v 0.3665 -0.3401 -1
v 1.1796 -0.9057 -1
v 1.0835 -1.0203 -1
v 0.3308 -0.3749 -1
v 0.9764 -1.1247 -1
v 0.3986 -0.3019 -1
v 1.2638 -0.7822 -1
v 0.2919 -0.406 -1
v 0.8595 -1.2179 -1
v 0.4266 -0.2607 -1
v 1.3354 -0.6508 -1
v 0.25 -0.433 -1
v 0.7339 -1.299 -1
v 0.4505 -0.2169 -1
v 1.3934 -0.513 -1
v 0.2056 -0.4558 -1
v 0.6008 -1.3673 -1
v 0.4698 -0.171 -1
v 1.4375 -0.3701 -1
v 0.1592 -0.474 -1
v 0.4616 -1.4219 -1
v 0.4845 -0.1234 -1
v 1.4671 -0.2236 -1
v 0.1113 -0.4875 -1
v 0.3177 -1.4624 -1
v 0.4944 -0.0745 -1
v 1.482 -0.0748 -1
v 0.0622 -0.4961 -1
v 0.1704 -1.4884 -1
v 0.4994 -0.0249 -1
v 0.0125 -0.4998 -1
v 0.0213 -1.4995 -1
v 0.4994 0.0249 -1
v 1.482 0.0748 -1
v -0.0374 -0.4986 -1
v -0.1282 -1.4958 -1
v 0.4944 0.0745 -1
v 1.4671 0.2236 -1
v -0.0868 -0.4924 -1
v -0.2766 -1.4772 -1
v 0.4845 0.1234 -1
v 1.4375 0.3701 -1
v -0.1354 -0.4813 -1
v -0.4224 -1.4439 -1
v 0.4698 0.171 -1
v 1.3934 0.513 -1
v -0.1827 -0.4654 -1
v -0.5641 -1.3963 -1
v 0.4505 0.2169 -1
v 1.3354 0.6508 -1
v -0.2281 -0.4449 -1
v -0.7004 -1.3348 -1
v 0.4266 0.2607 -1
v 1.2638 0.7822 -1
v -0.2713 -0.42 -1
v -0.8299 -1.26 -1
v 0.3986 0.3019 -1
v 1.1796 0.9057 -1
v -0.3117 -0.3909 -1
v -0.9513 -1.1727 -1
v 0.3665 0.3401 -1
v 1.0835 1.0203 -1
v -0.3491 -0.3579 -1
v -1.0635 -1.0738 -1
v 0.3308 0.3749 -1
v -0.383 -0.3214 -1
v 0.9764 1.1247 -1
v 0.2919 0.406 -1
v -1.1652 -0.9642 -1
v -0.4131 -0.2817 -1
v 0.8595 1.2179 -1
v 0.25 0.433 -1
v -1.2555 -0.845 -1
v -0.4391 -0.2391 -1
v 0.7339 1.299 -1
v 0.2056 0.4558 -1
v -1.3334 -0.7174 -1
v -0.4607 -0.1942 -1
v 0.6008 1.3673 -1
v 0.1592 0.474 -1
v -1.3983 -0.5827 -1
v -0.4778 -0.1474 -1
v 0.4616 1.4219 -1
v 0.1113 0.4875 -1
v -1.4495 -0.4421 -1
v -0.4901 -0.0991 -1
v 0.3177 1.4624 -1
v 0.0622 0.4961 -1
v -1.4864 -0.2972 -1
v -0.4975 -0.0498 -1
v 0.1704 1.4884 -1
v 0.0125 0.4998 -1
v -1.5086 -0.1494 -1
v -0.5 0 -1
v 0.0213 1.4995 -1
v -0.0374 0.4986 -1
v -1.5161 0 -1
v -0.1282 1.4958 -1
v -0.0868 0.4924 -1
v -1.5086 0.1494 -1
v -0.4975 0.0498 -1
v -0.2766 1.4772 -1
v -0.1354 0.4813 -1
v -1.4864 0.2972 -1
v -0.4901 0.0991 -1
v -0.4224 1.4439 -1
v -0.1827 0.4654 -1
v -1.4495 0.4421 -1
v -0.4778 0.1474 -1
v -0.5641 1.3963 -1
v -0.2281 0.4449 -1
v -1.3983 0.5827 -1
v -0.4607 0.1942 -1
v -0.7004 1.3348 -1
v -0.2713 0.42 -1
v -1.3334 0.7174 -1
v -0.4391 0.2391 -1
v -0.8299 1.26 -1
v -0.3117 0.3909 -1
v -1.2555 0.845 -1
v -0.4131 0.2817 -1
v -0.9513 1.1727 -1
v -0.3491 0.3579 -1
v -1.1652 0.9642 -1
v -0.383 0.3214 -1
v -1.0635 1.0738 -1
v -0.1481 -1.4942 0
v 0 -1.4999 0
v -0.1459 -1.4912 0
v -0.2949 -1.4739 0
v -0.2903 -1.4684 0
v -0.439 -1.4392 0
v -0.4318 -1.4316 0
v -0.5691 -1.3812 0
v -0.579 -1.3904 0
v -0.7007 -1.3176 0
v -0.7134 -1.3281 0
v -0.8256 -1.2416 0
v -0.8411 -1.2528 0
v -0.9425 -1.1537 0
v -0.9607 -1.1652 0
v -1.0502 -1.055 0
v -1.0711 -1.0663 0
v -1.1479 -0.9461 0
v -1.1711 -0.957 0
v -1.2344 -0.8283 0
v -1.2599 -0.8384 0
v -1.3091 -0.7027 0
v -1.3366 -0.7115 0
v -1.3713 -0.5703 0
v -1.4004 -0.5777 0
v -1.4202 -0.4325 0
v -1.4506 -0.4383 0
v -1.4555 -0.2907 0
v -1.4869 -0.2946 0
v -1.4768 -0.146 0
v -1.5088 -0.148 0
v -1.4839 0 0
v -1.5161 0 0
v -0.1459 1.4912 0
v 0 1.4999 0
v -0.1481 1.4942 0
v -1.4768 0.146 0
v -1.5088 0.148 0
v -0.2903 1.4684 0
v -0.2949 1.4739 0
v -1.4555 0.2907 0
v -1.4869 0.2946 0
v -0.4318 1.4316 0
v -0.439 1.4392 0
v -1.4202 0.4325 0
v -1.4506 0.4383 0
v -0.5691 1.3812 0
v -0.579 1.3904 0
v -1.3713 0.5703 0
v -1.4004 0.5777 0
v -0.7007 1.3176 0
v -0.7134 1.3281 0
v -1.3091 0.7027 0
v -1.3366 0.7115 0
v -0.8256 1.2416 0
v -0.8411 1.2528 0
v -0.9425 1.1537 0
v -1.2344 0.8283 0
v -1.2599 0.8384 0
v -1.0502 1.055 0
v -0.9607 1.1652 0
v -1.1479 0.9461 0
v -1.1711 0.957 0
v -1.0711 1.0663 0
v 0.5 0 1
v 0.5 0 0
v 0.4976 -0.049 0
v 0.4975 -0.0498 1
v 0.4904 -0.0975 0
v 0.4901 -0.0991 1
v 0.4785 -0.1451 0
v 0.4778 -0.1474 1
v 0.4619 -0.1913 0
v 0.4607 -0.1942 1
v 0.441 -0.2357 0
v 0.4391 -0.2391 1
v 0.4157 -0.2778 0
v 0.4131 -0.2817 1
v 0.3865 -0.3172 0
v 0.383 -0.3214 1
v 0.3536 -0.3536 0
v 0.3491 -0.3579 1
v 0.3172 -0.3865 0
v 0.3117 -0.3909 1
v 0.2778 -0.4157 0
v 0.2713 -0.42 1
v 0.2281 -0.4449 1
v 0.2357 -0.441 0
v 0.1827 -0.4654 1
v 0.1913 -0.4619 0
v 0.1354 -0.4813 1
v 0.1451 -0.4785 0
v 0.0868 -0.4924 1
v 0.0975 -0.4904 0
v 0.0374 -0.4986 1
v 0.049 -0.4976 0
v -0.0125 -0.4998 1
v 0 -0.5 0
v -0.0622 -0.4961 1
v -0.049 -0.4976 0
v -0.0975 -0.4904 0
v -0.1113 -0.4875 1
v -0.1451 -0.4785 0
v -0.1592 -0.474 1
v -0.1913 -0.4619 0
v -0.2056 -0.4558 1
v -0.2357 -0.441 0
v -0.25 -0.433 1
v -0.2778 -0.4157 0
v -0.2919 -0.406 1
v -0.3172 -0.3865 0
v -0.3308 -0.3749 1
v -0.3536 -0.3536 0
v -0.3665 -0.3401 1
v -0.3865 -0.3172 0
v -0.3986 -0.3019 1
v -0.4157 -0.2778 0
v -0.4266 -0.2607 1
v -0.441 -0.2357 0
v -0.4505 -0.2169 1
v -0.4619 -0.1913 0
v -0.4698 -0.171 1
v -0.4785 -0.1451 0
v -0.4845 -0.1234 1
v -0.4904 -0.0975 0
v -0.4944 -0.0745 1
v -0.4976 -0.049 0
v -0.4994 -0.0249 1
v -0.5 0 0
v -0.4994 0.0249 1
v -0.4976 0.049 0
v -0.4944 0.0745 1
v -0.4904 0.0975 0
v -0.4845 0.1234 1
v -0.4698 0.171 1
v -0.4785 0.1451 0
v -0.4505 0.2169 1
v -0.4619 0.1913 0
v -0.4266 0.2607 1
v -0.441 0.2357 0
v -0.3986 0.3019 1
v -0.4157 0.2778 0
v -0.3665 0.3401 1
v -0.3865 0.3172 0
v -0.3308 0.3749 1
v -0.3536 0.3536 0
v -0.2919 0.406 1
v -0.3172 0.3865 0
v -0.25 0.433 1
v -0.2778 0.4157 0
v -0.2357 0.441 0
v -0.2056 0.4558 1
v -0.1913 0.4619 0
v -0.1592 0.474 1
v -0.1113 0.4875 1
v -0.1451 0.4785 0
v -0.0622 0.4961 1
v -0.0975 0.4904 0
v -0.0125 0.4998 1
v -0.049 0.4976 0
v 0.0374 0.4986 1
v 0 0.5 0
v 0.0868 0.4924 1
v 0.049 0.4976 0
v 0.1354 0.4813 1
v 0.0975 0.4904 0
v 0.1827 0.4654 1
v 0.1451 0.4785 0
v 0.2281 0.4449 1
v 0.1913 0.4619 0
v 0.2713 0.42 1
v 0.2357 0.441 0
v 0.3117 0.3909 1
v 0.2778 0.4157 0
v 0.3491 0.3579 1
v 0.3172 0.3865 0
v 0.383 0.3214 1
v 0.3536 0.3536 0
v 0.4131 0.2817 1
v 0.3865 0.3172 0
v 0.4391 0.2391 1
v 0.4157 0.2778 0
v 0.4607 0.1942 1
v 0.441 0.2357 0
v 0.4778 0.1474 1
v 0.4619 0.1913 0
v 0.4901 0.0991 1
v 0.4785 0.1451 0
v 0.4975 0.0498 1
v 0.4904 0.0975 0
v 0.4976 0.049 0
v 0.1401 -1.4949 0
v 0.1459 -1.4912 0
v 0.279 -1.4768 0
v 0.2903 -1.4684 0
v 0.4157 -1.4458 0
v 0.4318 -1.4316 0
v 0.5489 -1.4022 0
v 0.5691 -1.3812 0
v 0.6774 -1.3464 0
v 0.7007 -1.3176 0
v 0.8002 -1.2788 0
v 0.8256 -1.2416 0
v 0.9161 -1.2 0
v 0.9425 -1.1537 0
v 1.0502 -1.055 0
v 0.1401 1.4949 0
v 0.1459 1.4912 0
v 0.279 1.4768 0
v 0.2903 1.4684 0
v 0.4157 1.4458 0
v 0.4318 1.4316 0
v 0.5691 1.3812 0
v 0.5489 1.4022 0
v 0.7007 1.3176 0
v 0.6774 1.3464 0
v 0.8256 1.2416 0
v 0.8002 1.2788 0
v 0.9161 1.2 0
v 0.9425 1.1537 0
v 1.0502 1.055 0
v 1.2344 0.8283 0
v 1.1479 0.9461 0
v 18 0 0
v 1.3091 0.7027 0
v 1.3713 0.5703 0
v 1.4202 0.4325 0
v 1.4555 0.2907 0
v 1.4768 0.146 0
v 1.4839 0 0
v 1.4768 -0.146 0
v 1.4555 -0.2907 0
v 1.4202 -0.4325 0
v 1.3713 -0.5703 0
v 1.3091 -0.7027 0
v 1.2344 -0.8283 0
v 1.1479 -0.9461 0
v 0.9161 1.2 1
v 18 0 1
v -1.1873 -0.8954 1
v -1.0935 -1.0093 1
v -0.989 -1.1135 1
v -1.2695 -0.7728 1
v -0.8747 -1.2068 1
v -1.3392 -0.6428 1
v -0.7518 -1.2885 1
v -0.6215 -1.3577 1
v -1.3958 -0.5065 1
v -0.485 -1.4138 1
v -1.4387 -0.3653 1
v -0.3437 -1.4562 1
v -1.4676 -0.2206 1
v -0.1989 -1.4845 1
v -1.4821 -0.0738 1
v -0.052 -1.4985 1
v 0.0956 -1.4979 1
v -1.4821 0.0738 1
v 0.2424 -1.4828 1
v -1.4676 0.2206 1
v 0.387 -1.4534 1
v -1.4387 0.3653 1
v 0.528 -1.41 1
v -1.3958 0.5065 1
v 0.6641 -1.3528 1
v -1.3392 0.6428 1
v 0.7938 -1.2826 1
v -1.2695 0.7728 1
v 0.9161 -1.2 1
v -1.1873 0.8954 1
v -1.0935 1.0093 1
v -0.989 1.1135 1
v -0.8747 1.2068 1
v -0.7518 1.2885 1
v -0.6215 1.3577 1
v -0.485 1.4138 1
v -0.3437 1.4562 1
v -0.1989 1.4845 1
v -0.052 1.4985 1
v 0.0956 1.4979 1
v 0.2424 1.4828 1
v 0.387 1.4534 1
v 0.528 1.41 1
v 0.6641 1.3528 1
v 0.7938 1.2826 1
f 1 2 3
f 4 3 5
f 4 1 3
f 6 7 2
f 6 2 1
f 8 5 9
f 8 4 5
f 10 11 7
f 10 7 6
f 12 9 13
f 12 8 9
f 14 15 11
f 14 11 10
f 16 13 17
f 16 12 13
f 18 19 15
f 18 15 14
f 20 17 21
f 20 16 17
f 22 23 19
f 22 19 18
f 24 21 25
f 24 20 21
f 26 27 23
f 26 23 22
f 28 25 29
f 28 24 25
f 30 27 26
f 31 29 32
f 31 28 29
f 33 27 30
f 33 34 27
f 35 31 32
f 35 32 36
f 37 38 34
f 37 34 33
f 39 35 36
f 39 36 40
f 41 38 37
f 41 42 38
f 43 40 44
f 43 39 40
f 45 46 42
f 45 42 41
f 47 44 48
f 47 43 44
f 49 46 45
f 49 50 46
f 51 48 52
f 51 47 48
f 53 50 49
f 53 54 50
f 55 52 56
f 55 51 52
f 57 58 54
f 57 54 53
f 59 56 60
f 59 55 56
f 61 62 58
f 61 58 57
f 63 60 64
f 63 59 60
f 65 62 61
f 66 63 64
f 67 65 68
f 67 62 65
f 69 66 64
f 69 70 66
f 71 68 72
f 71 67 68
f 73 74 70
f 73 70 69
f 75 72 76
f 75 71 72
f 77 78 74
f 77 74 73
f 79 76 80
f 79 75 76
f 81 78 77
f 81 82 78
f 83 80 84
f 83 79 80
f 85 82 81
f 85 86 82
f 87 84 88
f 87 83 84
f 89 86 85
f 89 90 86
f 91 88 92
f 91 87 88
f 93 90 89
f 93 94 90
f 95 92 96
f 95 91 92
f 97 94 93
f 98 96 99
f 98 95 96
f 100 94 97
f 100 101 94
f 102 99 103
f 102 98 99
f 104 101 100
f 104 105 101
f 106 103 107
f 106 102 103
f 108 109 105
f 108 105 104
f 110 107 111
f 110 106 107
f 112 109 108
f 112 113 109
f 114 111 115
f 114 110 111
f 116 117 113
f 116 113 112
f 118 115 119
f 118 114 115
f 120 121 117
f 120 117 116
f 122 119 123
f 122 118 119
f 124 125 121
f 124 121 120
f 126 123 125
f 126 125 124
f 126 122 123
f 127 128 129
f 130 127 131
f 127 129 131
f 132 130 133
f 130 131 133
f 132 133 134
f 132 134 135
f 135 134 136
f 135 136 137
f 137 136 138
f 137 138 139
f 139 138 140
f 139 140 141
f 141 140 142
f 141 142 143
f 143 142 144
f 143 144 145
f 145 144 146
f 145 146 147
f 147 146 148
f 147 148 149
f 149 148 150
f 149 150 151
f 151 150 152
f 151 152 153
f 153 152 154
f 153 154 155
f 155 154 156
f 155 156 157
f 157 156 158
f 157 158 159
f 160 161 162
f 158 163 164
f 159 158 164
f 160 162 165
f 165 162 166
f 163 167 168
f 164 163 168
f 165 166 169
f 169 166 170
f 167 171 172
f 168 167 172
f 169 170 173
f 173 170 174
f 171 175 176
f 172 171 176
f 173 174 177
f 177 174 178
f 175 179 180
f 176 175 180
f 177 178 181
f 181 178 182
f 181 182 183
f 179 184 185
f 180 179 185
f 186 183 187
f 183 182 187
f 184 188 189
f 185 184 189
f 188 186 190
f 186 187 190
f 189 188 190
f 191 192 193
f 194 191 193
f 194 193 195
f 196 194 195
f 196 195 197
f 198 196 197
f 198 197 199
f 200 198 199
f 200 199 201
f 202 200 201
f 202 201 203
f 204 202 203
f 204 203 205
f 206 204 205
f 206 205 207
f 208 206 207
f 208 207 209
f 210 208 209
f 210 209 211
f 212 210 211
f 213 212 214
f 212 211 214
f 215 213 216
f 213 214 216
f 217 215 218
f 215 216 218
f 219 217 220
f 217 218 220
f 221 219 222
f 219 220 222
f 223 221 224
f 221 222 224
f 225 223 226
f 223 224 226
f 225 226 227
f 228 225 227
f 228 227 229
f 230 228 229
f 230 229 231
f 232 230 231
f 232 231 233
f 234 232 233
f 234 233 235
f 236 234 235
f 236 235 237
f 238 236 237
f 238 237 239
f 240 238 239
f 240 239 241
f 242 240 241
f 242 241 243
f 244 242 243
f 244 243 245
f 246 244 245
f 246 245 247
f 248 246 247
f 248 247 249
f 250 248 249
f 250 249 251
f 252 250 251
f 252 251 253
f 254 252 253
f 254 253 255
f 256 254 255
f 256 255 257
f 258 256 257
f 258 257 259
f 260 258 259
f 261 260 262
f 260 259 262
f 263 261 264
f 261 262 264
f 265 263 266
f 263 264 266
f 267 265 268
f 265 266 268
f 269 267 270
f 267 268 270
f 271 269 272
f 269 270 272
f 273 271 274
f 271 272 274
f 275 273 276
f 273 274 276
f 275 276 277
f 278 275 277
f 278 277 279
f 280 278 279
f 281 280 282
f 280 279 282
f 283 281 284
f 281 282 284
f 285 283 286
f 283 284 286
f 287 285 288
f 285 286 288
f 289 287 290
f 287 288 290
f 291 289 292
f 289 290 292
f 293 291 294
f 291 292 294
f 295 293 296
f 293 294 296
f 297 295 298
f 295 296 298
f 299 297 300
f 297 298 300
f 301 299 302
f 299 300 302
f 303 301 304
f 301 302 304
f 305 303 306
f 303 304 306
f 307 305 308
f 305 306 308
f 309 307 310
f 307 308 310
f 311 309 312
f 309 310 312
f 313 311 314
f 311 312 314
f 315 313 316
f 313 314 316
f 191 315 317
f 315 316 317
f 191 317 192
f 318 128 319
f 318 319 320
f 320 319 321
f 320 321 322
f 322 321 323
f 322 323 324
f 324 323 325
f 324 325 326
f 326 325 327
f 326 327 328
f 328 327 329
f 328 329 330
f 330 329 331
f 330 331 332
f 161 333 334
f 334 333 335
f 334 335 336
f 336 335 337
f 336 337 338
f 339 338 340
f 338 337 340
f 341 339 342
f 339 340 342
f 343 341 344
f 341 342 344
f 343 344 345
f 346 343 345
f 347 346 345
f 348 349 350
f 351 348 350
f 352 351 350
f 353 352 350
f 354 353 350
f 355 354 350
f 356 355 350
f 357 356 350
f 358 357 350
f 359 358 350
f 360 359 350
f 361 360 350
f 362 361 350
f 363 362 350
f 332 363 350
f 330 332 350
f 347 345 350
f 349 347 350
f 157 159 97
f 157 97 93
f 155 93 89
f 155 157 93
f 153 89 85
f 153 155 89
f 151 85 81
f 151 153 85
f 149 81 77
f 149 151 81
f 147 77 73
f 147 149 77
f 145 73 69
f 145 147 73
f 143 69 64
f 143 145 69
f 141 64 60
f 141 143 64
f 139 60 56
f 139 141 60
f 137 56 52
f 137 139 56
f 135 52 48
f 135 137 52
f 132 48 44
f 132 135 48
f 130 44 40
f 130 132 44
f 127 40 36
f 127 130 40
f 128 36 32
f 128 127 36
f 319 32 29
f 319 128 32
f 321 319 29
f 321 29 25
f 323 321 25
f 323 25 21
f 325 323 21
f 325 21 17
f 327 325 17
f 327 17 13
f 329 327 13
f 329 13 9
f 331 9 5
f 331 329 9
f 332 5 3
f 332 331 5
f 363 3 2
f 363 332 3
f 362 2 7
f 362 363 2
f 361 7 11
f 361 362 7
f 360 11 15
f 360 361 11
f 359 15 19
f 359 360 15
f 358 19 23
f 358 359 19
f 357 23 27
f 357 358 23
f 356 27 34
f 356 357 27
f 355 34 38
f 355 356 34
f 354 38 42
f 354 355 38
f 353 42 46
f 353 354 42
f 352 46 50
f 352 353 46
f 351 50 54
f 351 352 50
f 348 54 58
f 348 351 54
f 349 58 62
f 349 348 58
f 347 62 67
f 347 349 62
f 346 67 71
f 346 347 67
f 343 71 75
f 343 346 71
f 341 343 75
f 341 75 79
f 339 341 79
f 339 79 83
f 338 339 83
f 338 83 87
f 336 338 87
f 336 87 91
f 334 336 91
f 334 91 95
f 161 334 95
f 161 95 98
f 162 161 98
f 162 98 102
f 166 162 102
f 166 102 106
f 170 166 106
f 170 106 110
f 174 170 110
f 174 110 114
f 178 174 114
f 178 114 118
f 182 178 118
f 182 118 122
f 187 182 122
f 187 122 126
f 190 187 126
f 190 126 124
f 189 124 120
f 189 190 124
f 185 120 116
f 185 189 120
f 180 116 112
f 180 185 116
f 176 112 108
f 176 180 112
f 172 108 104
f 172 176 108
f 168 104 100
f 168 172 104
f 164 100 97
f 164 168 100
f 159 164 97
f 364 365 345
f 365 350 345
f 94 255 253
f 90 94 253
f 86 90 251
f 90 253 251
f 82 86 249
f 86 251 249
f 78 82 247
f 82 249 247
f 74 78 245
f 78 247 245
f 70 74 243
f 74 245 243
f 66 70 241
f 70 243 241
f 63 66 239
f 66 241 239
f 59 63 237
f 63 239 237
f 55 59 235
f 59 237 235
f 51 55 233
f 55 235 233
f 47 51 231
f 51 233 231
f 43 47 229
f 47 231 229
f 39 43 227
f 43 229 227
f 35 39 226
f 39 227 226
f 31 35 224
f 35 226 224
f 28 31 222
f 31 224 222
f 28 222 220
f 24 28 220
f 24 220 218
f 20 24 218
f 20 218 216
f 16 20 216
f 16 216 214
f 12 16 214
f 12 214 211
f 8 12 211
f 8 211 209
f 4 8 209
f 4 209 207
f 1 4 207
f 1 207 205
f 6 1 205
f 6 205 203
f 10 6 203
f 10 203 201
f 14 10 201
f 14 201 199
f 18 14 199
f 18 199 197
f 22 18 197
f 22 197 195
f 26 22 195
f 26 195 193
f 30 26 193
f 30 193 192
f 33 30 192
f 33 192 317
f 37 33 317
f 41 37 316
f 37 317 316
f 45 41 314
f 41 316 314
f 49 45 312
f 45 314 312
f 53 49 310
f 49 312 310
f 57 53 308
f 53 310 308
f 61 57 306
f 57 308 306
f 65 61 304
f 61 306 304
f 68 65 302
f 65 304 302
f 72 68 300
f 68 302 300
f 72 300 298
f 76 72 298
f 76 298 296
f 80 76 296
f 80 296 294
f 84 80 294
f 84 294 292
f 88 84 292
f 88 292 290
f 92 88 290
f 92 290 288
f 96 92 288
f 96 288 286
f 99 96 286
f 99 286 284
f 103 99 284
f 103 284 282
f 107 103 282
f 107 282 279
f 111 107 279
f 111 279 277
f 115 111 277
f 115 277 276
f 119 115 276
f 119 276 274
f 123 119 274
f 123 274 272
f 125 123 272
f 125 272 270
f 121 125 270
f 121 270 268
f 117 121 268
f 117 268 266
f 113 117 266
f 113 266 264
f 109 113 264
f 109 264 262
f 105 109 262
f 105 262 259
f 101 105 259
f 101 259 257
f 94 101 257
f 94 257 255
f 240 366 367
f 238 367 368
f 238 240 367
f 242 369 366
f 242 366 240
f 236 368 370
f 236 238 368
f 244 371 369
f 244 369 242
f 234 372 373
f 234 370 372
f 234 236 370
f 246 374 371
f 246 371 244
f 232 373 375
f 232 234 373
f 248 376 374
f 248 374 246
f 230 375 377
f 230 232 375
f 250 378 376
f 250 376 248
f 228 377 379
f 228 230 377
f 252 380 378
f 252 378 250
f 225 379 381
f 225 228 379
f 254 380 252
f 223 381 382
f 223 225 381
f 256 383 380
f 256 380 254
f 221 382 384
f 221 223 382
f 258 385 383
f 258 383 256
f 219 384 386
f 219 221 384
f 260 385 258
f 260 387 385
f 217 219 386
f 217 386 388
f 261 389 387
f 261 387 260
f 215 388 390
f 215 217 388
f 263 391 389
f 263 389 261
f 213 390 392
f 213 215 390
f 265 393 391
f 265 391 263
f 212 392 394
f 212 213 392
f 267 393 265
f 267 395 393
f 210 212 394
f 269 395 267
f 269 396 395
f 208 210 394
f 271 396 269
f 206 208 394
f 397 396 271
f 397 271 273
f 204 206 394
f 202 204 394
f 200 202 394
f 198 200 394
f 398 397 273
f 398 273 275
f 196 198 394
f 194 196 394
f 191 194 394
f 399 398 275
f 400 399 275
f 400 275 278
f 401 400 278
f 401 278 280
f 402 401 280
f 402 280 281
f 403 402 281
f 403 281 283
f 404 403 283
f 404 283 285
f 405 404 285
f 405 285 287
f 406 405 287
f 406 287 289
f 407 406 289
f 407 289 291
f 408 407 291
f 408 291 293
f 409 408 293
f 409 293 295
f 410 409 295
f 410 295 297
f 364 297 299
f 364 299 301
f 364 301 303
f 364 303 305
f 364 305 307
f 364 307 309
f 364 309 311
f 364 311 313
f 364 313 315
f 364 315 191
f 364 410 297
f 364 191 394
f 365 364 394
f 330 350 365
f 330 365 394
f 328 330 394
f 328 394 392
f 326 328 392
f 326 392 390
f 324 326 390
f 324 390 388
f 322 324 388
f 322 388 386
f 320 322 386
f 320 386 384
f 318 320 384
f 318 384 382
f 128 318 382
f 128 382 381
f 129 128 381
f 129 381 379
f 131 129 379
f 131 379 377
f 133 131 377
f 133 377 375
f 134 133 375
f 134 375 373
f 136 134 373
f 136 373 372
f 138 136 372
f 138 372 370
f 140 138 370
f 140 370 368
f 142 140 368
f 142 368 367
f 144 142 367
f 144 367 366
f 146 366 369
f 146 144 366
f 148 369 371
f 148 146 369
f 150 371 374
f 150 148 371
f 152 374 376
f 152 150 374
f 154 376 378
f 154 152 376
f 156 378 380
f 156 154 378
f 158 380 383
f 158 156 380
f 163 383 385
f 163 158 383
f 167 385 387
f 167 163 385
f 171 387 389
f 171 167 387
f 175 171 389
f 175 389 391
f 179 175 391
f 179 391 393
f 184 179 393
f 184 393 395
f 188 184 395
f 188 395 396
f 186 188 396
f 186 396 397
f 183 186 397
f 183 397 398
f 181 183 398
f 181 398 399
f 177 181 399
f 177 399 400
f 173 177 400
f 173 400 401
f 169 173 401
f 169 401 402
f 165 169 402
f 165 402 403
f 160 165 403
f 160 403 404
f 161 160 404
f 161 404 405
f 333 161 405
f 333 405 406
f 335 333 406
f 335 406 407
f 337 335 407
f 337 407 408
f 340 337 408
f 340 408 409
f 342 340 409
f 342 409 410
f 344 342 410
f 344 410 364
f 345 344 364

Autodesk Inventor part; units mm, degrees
ref_plane "YZ Plane" through (0, 0, 0) normal (1, 0, 0) x (0, 1, 0)
ref_plane "XZ Plane" through (0, 0, 0) normal (0, 1, 0) x (-1, 0, 0)
ref_plane "XY Plane" through (0, 0, 0) normal (0, 0, 1) x (1, 0, 0)
sketch "Sketch1" plane through (0, 0, 0) normal (0, 0, 1) x (1, 0, 0)
  circle A0 centre (0, 0) radius 0.5
  circle A1 centre (0.0161, 0) radius 1.5
  line L0 (-5.3807, 0) -> (21.8968, 0) projected
  line L1 (0.0161, 0) -> (15.0161, 0)
  line L2 (15.0161, 0) -> (18, 0)
  line L3 (18, 0) -> (0.9161, 1.2)
  line L4 (18, 0) -> (0.9161, -1.2)
  dimension "d0" = 1
  dimension "d1" = 3
  dimension "d3" = 2.4
  dimension "d13" = 18
extrude "Extrusion1" add sketch "Sketch1" along normal blind 1 contours L0 A1 A0 | A0 L0 A1 | L0 L4 A1 | A1 L3 L0
sketch "Sketch2" plane through (0, 0, 0) normal (0, 0, -1) x (-1, 0, 0)
  circle A0 centre (0, 0) radius 0.5
  circle A1 centre (0.0161, 0) radius 1.5
  line L0 (-5.7839, 0) -> (24.3161, 0)
  line L1 (0.0161, 0) -> (20.0161, 0)
  line L2 (20.0161, 0) -> (20.0155, 0)
  line L3 (20.0155, 0) -> (0.8452, 1.25)
  line L4 (20.0155, 0) -> (0.8452, -1.25)
  dimension "d6" = 1
  dimension "d7" = 3
  dimension "d8" = 20
  dimension "d9" = 2.5
extrude "Extrusion2" add sketch "Sketch2" along normal blind 1 contours L0 A1 A0 | A0 L0 A1
equation "\"d0\" = pointer_axis"
equation "\"d1\" = pointer_axis_outside"
equation "\"d3\" = 0.8 * pointer_axis_outside"
equation "\"d13\" = pointer_length"
equation "\"circle_dimension\" = 56"
equation "\"circle_dimension_inner\" = 47"
equation "\"hole_from_center\" = 63.5"
equation "\"hole_distance\" = 22.45064"
equation "\"ring_depth\" = 6"
equation "\"ring_thickness\" = 9"
equation "\"ring_top_thickness\" = 2"
equation "\"ring_outer_bevel_height\" = 3"
equation "\"ring_outer_bevel_depth\" = 0.5"
equation "\"ring_inner_bevel_depth\" = 3.5"
equation "\"screw_distance_center\" = 15"
equation "\"screw_distance_outside\" = 3.5"
equation "\"front_plate_thickness\" = 2"
equation "\"glass_thickness\" = 2"
equation "\"encoders\" = 0"
equation "\"encoder_axis\" = 8"
equation "\"encoder_emboss\" = 0"
equation "\"encoder_width\" = 27"
equation "\"encoder_rad\" = 49"
equation "\"encoder_extrude_hight\" = 3"
equation "\"pointer_axis\" = 1"
equation "\"pointer_axis_outside\" = 3"
equation "\"pointer_length\" = 18"
properties part number "pointer_small" material "ABS Plastic"
